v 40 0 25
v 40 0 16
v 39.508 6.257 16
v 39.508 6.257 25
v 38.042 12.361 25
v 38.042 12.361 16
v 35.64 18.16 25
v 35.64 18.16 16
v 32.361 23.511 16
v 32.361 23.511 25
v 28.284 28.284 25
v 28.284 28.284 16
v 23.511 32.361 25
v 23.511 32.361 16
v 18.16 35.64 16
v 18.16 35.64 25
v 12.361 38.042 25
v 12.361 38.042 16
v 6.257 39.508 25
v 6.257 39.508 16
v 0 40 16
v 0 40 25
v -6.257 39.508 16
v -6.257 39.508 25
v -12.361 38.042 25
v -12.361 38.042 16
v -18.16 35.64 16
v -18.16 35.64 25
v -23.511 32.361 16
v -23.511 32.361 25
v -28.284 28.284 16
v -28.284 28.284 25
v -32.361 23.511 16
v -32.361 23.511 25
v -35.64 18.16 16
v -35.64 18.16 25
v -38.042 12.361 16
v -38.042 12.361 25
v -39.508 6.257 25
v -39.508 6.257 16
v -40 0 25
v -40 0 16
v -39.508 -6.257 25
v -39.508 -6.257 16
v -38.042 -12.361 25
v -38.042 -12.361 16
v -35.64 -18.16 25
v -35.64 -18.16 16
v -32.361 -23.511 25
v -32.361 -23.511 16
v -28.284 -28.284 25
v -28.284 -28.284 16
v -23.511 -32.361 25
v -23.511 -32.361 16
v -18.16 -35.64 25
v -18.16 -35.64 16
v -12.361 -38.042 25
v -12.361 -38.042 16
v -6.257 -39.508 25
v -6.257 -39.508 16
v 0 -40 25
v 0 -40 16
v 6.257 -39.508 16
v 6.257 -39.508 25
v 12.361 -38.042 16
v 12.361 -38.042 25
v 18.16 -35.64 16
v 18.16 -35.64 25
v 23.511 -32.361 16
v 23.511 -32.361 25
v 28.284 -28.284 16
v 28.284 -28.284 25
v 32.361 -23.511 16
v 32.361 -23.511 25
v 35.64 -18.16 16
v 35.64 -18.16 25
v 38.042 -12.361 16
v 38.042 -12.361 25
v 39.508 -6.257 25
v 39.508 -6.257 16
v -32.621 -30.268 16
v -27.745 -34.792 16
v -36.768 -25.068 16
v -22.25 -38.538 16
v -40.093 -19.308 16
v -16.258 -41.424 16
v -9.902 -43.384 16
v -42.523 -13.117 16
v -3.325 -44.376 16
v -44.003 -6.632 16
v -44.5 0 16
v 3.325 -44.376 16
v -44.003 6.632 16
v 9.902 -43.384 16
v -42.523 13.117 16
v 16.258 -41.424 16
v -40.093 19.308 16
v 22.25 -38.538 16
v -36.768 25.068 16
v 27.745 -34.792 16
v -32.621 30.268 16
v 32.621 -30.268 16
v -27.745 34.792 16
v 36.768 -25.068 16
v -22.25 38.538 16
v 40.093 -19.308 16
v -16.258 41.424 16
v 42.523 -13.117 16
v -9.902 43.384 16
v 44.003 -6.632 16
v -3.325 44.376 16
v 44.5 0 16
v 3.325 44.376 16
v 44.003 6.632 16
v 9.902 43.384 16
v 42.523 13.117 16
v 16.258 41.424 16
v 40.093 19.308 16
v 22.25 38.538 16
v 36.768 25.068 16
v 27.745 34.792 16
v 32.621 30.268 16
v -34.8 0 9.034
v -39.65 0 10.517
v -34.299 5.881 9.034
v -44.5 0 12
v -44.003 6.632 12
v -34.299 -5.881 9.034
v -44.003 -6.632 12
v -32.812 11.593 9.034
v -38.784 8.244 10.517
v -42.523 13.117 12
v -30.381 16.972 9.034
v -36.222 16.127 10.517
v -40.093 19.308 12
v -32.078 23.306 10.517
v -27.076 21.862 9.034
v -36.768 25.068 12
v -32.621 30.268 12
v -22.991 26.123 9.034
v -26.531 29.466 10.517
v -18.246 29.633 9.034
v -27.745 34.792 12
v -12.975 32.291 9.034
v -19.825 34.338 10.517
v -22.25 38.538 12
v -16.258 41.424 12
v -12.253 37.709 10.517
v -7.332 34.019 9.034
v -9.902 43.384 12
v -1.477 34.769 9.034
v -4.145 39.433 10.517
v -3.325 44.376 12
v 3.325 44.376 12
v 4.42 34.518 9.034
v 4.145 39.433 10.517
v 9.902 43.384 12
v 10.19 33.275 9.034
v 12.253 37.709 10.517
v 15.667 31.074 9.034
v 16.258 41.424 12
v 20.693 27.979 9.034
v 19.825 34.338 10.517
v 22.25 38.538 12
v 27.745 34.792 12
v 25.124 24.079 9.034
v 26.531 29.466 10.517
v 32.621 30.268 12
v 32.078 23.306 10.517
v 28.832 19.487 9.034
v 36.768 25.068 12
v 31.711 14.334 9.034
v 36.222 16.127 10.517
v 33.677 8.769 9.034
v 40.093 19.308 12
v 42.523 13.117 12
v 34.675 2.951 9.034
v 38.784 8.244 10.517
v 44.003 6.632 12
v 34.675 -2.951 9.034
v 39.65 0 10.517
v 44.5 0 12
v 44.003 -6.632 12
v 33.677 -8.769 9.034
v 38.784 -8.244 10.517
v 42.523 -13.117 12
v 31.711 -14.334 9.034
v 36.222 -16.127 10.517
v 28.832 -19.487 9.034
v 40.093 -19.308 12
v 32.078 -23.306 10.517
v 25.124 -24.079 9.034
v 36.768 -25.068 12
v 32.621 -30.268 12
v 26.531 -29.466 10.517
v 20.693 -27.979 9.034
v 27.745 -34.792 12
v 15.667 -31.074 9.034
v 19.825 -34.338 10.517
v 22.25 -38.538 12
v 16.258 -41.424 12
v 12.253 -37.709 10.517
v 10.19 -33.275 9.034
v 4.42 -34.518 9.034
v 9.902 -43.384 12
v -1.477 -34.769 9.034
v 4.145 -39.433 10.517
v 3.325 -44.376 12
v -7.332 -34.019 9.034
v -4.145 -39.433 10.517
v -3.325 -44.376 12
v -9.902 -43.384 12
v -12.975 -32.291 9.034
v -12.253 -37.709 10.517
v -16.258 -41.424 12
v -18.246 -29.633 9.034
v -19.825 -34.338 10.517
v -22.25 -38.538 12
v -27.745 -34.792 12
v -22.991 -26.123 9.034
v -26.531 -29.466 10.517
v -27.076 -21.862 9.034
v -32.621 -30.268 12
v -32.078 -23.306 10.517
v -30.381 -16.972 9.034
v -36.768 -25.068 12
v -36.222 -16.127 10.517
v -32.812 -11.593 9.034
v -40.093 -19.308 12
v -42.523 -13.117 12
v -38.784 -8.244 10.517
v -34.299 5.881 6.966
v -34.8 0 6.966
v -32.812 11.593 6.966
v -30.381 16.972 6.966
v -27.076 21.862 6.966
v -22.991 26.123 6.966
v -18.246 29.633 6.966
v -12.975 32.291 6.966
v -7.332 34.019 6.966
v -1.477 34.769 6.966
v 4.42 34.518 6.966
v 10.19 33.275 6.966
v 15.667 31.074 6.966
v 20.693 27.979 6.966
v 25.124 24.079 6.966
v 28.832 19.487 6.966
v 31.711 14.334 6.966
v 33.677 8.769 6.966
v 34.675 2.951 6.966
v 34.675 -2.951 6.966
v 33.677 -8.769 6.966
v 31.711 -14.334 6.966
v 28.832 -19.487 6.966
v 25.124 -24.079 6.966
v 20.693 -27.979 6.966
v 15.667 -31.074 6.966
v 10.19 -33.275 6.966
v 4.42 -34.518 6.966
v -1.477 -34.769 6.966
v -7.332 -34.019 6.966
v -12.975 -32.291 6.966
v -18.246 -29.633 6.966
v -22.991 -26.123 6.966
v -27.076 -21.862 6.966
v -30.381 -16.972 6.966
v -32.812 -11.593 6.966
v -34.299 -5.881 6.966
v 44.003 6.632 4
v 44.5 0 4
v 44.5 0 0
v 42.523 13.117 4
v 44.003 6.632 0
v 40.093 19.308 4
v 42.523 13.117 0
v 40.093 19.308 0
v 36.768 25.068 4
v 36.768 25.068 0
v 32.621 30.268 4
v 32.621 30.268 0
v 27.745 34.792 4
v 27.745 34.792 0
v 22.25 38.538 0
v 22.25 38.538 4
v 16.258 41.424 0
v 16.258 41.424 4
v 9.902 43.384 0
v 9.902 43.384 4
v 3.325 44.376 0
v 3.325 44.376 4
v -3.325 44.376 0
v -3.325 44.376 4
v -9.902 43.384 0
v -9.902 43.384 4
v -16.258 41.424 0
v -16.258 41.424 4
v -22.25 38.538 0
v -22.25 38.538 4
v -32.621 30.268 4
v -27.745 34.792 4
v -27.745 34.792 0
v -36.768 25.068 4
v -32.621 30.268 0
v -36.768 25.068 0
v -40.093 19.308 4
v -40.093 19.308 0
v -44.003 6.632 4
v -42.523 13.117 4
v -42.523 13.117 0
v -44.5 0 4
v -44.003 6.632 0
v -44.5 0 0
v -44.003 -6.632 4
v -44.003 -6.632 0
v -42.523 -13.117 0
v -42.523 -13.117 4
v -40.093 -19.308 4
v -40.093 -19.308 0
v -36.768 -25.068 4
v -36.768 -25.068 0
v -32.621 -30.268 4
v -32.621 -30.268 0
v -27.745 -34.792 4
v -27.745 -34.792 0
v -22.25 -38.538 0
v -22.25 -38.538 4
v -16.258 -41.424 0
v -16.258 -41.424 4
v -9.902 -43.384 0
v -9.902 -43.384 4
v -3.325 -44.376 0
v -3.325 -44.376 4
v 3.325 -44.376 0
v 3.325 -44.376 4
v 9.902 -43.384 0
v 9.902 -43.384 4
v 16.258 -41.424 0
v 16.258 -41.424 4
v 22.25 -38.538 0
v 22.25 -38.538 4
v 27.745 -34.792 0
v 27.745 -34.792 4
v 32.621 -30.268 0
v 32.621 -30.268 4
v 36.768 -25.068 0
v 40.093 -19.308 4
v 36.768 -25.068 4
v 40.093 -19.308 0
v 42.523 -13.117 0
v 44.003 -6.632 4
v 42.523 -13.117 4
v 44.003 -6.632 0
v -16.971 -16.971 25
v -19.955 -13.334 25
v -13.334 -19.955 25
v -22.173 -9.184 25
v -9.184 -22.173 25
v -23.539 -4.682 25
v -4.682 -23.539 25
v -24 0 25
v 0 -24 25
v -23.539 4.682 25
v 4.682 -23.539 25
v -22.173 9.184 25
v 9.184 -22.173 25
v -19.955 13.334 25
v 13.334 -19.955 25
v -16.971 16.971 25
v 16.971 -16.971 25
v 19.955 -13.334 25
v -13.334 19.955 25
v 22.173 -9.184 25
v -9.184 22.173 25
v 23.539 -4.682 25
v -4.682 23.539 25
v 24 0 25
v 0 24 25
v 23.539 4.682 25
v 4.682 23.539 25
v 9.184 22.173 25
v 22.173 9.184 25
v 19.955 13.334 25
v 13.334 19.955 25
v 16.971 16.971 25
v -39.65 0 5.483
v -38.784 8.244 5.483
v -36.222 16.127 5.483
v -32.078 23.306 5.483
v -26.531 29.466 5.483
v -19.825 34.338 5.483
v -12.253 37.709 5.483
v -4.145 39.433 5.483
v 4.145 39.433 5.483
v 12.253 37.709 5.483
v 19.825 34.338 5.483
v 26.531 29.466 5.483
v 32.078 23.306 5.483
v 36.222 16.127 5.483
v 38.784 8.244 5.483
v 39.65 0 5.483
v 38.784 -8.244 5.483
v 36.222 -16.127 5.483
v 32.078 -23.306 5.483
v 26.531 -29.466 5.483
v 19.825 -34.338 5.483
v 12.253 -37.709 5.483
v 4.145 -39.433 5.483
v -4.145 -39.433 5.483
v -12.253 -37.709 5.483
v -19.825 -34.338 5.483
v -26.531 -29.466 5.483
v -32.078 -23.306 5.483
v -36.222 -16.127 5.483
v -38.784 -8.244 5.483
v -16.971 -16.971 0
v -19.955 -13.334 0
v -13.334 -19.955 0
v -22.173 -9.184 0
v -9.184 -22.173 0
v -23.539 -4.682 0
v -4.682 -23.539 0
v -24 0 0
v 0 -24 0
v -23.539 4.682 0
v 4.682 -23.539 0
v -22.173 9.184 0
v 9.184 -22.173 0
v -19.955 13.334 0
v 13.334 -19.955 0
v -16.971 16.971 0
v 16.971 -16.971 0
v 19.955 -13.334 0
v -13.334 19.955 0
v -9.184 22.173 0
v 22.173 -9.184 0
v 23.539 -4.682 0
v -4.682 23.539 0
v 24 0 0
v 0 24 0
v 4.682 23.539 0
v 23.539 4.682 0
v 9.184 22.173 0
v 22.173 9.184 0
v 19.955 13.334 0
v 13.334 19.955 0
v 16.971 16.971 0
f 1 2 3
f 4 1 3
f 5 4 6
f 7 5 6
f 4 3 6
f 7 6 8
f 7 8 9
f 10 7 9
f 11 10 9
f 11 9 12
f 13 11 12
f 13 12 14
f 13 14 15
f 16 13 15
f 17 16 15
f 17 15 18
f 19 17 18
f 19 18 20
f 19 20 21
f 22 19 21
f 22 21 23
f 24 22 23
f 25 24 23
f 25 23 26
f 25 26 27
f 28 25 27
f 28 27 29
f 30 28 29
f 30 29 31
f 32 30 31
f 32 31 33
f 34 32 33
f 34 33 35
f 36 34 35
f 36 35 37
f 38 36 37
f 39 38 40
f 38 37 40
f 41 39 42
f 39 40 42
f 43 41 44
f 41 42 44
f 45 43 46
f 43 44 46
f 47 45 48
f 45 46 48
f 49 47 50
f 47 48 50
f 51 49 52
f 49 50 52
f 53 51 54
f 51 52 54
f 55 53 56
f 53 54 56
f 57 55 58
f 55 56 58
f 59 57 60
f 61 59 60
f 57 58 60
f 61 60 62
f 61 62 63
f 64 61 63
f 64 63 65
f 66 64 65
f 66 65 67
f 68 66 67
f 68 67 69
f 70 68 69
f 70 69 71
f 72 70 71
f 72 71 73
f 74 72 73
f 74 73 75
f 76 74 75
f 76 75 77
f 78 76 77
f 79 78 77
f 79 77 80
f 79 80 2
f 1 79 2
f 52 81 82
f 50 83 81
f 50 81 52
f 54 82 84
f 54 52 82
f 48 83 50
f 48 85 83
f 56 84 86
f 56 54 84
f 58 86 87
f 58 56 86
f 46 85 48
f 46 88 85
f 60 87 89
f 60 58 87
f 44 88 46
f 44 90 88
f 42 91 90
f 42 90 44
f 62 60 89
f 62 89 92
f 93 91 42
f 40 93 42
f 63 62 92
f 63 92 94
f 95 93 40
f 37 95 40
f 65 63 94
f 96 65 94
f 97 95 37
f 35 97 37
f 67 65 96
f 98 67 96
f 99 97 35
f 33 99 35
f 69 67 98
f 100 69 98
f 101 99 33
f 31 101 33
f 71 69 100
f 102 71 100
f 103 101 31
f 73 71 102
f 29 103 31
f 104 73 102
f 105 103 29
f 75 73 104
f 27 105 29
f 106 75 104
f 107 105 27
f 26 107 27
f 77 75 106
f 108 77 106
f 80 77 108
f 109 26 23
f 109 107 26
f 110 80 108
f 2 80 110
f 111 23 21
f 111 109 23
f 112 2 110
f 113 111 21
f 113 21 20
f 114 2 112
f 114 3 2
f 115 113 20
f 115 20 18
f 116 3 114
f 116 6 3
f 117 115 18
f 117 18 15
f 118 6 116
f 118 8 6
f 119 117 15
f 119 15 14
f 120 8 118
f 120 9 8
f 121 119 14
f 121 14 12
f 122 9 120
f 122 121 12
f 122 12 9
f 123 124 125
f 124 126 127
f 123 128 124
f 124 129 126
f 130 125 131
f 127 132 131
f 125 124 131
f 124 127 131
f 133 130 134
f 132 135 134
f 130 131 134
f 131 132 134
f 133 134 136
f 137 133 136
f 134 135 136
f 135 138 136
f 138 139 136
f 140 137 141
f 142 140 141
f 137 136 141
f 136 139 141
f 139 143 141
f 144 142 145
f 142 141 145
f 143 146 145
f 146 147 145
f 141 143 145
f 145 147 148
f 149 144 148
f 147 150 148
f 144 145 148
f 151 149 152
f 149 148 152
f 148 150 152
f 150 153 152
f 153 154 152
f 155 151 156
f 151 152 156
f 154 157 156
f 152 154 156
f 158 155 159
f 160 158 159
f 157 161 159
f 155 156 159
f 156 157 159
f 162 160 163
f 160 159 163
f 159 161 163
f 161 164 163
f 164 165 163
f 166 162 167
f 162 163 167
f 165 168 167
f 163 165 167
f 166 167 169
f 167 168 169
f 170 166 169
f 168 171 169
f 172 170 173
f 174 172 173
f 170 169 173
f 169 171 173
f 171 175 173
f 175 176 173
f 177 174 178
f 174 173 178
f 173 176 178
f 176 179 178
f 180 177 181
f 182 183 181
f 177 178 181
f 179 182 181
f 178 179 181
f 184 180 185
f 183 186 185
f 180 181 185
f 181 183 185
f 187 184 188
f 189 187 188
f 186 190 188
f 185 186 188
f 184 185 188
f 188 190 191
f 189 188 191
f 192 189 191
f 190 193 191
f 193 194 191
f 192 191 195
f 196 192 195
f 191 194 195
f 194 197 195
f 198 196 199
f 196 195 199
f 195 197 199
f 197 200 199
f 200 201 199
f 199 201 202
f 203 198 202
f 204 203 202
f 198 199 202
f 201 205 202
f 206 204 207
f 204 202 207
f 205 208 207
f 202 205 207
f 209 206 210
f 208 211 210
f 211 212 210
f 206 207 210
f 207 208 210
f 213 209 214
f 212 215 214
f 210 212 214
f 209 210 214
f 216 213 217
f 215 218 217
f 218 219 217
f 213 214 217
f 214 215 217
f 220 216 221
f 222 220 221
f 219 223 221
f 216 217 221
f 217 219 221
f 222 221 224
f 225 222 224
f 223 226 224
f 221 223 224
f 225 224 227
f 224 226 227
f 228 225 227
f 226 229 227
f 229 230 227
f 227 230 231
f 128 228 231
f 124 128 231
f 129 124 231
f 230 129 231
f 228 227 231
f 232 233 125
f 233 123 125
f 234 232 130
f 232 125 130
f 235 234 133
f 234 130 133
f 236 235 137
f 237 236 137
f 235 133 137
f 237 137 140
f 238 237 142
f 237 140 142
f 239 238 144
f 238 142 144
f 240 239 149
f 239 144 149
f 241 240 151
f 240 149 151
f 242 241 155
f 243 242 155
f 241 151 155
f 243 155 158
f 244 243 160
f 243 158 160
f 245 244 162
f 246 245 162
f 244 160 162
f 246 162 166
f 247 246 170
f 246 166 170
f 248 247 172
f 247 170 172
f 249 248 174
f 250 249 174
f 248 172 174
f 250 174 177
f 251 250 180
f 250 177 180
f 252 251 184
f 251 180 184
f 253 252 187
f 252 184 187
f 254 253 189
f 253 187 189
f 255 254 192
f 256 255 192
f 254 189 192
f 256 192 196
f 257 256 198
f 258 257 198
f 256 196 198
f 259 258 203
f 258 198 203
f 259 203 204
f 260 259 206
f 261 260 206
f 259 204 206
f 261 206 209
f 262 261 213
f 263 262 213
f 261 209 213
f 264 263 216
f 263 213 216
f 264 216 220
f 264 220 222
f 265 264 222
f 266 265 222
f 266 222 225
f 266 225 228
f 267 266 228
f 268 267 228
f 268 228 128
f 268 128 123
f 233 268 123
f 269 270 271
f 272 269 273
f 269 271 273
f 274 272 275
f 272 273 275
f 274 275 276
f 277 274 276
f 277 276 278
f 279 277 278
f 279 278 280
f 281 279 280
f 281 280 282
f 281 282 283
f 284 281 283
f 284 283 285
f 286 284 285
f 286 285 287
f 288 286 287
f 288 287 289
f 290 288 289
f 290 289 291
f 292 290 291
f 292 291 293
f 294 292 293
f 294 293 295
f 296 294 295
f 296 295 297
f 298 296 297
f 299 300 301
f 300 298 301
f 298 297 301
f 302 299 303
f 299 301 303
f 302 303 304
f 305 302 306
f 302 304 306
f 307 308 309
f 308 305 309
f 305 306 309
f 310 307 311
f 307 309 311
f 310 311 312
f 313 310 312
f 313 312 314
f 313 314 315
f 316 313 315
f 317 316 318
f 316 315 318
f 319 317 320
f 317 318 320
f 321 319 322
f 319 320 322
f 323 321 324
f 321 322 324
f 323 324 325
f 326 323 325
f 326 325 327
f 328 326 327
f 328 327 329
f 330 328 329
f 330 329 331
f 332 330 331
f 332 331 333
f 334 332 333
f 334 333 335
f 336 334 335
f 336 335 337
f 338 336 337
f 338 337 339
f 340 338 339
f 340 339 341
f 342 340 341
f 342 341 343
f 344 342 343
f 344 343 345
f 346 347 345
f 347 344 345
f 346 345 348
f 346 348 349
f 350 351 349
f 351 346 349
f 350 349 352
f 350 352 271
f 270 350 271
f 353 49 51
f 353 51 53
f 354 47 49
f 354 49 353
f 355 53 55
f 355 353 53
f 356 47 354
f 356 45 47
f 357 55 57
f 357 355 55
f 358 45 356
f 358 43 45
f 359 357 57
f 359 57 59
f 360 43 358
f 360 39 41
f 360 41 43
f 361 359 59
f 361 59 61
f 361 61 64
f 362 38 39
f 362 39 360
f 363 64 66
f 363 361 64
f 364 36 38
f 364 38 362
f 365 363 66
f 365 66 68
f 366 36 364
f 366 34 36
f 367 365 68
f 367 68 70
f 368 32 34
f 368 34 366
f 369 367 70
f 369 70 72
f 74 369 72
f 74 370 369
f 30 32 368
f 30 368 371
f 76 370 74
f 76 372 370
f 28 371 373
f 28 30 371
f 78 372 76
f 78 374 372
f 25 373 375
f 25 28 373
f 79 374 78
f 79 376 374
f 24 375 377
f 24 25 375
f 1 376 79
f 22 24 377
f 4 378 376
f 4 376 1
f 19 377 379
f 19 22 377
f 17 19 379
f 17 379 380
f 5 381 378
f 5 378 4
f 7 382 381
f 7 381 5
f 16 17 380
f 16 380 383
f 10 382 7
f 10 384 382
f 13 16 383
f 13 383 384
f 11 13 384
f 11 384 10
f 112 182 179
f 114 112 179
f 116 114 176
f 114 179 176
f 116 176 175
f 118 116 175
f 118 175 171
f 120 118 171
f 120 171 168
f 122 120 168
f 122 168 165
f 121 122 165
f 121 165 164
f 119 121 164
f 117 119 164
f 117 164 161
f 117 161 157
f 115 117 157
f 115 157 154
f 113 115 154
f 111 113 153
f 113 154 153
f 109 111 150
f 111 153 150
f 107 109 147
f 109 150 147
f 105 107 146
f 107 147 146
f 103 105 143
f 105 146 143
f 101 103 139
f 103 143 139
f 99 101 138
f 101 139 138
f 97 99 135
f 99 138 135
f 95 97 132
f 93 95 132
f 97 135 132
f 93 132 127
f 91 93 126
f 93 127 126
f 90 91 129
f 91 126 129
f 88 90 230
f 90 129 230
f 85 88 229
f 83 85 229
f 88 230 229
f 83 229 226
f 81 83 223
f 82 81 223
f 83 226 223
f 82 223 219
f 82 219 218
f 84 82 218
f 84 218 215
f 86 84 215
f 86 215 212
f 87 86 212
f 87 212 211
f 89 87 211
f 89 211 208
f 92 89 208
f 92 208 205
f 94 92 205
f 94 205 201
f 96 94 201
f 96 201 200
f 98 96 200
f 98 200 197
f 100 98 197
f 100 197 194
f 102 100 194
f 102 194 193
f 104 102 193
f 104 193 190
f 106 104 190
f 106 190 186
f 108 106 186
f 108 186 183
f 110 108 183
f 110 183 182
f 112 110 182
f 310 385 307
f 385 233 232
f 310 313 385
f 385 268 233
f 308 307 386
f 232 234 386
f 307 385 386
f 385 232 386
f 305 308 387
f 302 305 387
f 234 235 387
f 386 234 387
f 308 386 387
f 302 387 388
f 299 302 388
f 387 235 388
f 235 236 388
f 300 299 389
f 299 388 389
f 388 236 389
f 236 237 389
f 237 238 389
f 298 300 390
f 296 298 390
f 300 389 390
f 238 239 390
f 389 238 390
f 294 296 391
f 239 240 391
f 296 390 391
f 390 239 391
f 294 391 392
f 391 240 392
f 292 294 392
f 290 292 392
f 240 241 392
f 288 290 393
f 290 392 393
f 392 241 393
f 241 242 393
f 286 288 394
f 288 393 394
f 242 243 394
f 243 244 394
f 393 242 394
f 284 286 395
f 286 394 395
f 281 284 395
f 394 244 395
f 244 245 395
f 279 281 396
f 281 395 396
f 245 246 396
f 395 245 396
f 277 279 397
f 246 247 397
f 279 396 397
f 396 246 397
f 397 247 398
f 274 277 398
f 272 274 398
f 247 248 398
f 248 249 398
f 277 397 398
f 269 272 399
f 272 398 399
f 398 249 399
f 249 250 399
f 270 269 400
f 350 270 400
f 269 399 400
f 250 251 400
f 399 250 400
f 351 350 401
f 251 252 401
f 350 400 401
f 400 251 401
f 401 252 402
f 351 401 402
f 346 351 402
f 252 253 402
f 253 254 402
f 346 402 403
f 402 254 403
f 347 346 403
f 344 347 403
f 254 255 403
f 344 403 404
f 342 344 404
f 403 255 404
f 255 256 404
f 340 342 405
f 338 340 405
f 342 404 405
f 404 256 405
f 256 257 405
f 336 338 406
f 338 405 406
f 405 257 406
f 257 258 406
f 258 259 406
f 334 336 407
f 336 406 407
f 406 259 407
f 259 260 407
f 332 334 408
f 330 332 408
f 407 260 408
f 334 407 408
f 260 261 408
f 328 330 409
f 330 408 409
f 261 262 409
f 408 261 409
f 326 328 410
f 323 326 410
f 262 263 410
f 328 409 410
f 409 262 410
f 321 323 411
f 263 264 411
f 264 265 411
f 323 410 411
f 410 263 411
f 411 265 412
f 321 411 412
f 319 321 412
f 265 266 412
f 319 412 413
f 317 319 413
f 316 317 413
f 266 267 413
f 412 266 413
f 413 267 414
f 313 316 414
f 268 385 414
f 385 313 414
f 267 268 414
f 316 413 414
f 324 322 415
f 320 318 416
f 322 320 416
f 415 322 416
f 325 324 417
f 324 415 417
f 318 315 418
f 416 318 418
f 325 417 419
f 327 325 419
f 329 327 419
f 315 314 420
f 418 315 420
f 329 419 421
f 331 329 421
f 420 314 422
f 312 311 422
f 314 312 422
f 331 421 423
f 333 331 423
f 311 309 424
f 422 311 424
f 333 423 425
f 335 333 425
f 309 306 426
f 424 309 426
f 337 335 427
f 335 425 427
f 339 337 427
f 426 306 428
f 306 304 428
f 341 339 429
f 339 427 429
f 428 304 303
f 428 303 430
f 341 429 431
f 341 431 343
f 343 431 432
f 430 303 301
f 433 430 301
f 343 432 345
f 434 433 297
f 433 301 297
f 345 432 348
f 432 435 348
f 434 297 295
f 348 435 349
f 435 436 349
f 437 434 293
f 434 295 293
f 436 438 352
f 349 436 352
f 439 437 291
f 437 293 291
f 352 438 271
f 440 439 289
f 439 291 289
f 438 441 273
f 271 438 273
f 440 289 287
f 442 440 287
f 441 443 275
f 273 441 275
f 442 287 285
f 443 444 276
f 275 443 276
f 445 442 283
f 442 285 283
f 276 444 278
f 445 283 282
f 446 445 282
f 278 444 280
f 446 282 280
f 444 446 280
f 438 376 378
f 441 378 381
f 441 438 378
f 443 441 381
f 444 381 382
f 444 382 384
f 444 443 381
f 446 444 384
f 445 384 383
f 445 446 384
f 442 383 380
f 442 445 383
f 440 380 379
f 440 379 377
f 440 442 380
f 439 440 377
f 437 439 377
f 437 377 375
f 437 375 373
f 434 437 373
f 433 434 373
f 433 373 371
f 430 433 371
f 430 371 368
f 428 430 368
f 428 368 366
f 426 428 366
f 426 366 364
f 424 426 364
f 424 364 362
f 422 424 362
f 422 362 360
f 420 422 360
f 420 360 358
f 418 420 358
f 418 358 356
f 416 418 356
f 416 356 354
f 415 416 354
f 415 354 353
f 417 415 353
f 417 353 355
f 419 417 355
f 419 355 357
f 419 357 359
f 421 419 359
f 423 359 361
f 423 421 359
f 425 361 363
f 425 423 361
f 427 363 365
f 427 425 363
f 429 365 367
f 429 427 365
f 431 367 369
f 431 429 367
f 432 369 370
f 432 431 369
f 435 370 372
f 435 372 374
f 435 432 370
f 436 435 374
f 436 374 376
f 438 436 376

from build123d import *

# Parameters (mm, degrees)
F0_R     = 44.5
F0_R_2   = 40
F0_R_3   = 24
F1_DEPTH = 16
F2_DEPTH = 25


with BuildPart() as f1:
    # F0 (on Top) → F1 (new body)
    with BuildSketch(Plane.XY):
        Circle(F0_R)
        Circle(F0_R_2, mode=Mode.SUBTRACT)
        Circle(F0_R_2)
        Circle(F0_R_3, mode=Mode.SUBTRACT)
    extrude(amount=F1_DEPTH)

    # F0 (on Top) → F2 (join)
    with BuildSketch(Plane.XY):
        Circle(F0_R_2)
        Circle(F0_R_3, mode=Mode.SUBTRACT)
    extrude(amount=F2_DEPTH)

    # F3 (on Front) → F4 (revolve, cut)
    with BuildSketch(Plane.XZ):
        Polygon((-34.8, 9.034412), (-44.5, 12), (-44.5, 4), (-34.8, 6.965588), align=None)
    revolve(axis=Axis((0, 0, -5.625665), (0, 0, -1)), mode=Mode.SUBTRACT)


solid = f1.part
